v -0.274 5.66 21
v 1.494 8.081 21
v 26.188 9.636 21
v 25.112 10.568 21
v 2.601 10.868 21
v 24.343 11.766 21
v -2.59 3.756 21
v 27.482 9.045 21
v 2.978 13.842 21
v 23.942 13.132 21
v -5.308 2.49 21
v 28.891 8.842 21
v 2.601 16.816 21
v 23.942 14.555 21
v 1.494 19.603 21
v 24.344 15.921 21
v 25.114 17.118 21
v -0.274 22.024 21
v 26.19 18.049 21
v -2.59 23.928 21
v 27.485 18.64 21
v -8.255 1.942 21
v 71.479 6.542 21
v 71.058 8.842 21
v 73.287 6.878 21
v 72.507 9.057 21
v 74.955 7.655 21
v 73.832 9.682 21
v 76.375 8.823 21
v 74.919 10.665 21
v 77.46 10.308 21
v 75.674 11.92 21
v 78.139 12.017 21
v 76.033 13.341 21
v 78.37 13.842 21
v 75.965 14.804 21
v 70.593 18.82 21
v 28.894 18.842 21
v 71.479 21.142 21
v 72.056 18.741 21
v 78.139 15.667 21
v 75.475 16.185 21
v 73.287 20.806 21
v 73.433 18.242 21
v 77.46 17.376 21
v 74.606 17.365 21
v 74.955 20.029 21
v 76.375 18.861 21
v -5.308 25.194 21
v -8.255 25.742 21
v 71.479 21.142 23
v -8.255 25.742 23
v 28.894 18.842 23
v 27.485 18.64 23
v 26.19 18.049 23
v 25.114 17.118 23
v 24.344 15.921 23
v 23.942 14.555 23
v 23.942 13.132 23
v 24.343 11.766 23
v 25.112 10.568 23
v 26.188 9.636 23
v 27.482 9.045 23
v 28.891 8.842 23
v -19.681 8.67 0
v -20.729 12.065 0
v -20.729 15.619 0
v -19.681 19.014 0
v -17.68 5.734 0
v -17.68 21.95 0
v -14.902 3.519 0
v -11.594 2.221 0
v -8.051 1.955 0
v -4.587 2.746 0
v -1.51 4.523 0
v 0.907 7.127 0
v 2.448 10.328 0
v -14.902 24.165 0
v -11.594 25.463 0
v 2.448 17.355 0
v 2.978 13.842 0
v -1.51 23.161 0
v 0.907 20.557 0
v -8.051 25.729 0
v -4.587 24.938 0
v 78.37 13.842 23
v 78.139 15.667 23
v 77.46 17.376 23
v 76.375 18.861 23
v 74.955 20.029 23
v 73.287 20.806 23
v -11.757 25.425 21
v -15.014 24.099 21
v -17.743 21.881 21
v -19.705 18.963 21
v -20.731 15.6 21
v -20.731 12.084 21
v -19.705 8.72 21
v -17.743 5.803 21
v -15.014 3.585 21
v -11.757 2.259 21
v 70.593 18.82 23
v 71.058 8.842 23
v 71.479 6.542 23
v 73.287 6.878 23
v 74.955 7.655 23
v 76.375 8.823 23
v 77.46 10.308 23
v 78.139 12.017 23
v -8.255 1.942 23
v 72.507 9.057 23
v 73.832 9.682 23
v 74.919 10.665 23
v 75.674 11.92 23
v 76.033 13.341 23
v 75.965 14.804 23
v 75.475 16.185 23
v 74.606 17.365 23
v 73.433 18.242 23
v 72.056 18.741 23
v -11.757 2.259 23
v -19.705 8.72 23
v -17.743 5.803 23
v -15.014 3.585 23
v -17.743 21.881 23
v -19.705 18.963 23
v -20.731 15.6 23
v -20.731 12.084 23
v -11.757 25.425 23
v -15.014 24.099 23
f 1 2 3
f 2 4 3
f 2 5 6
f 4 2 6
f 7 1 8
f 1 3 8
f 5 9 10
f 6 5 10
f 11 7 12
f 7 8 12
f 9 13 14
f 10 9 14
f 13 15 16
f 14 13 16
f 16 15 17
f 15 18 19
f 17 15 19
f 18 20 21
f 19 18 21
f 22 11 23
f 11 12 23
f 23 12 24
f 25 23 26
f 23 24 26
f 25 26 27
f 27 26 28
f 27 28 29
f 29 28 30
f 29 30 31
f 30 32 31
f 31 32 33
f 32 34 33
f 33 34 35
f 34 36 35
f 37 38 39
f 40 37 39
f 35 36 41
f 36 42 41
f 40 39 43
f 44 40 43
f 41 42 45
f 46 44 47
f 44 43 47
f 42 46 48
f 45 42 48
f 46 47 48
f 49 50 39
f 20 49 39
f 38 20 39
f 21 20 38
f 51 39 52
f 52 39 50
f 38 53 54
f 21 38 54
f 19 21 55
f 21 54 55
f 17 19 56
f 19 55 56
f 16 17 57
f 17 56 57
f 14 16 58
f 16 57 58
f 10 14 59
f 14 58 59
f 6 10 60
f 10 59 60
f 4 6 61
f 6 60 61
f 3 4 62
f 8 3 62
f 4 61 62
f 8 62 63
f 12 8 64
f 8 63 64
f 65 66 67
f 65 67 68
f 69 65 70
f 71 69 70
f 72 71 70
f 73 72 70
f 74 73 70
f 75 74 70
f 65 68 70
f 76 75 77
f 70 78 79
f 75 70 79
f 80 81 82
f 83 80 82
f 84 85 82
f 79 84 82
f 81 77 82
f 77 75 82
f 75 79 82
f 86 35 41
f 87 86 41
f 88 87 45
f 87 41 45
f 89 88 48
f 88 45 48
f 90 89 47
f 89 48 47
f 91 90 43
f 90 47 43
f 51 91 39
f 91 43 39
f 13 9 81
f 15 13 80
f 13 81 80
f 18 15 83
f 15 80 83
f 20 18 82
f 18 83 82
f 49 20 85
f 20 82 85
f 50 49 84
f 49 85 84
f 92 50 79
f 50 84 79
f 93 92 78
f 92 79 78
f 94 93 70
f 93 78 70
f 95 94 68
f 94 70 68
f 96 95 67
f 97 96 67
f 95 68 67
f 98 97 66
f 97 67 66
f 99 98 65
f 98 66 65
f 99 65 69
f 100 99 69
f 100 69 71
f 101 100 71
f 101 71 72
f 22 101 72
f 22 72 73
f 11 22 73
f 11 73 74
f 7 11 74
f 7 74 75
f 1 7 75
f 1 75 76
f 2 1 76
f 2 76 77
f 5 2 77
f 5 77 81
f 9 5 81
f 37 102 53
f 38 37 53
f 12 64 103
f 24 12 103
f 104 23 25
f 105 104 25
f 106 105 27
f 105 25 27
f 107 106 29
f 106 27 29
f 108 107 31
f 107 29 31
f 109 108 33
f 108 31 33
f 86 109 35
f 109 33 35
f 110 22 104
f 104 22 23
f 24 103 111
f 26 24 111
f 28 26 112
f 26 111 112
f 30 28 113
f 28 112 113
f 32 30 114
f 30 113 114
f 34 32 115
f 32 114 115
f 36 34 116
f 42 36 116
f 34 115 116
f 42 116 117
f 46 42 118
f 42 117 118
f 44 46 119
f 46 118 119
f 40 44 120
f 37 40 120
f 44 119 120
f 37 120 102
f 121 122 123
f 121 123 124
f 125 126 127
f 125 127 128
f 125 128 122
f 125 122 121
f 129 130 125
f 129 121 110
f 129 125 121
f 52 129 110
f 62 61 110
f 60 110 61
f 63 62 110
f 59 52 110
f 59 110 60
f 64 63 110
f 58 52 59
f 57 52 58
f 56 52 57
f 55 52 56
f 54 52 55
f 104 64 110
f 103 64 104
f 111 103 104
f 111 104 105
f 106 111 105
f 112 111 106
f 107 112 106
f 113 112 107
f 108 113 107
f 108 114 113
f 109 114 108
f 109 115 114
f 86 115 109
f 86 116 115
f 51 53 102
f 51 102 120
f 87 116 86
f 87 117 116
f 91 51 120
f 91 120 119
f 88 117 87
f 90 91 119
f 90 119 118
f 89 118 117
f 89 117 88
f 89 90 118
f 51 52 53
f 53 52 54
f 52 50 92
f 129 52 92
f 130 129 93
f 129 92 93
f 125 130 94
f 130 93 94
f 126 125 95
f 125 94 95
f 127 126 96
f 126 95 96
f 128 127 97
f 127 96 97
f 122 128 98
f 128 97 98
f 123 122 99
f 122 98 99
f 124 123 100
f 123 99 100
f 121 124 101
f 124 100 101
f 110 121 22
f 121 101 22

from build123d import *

# Parameters (mm, degrees)
F0_R     = 11.919915
F1_DEPTH = 21
F3_DEPTH = 2
F5_DEPTH = 25


with BuildPart() as f1:
    # F0 (on Top) → F1 (new body)
    with BuildSketch(Plane.XY):
        with Locations((-8.941904, 13.841942)):
            Circle(F0_R)
    extrude(amount=F1_DEPTH)

    # F2 (on face) → F3 (join)
    with BuildSketch(Plane.XY.offset(21)):
        with BuildLine():
            ThreePointArc((-8.255348, 1.941816), (-0.273915, 5.659623), (2.978011, 13.841942))
            ThreePointArc((2.978011, 13.841942), (-0.273915, 22.024261), (-8.255348, 25.742068))
            ThreePointArc((-8.255348, 25.742068), (-20.861818, 13.841942), (-8.255348, 1.941816))
        make_face()
        with BuildLine():
            ThreePointArc((-8.255348, 25.742068), (-0.273915, 22.024261), (2.978011, 13.841942))
            Line((2.978011, 13.841942), (63.745973, 13.841942))
            ThreePointArc((63.745973, 13.841942), (66.038754, 19.159212), (71.479256, 21.141927))
            Line((71.479256, 21.141927), (-8.255348, 25.742068))
        make_face()
        with BuildLine():
            Line((63.745973, 13.841942), (2.978011, 13.841942))
            ThreePointArc((2.978011, 13.841942), (-0.273915, 5.659623), (-8.255348, 1.941816))
            Line((-8.255348, 1.941816), (71.479256, 6.541957))
            ThreePointArc((71.479256, 6.541957), (66.038754, 8.524672), (63.745973, 13.841942))
        make_face()
        with BuildLine():
            ThreePointArc((71.479256, 21.141927), (66.038754, 19.159212), (63.745973, 13.841942))
            ThreePointArc((63.745973, 13.841942), (66.038754, 8.524672), (71.479256, 6.541957))
            ThreePointArc((71.479256, 6.541957), (76.375366, 8.8226), (78.37022, 13.841942))
            ThreePointArc((78.37022, 13.841942), (76.375366, 18.861284), (71.479256, 21.141927))
        make_face()
    extrude(amount=F3_DEPTH)

    # F4 (on face) → F5 (cut)
    with BuildSketch(Plane.XY.offset(23)):
        with BuildLine():
            Line((28.891168, 8.841942), (71.058096, 8.841942))
            ThreePointArc((71.058096, 8.841942), (76.052672, 14.074788), (70.59291, 18.820255))
            Line((70.59291, 18.820255), (28.893769, 18.841941))
            ThreePointArc((28.893769, 18.841941), (23.891169, 13.843242), (28.891168, 8.841942))
        make_face()
    extrude(amount=-F5_DEPTH, mode=Mode.SUBTRACT)


solid = f1.part
